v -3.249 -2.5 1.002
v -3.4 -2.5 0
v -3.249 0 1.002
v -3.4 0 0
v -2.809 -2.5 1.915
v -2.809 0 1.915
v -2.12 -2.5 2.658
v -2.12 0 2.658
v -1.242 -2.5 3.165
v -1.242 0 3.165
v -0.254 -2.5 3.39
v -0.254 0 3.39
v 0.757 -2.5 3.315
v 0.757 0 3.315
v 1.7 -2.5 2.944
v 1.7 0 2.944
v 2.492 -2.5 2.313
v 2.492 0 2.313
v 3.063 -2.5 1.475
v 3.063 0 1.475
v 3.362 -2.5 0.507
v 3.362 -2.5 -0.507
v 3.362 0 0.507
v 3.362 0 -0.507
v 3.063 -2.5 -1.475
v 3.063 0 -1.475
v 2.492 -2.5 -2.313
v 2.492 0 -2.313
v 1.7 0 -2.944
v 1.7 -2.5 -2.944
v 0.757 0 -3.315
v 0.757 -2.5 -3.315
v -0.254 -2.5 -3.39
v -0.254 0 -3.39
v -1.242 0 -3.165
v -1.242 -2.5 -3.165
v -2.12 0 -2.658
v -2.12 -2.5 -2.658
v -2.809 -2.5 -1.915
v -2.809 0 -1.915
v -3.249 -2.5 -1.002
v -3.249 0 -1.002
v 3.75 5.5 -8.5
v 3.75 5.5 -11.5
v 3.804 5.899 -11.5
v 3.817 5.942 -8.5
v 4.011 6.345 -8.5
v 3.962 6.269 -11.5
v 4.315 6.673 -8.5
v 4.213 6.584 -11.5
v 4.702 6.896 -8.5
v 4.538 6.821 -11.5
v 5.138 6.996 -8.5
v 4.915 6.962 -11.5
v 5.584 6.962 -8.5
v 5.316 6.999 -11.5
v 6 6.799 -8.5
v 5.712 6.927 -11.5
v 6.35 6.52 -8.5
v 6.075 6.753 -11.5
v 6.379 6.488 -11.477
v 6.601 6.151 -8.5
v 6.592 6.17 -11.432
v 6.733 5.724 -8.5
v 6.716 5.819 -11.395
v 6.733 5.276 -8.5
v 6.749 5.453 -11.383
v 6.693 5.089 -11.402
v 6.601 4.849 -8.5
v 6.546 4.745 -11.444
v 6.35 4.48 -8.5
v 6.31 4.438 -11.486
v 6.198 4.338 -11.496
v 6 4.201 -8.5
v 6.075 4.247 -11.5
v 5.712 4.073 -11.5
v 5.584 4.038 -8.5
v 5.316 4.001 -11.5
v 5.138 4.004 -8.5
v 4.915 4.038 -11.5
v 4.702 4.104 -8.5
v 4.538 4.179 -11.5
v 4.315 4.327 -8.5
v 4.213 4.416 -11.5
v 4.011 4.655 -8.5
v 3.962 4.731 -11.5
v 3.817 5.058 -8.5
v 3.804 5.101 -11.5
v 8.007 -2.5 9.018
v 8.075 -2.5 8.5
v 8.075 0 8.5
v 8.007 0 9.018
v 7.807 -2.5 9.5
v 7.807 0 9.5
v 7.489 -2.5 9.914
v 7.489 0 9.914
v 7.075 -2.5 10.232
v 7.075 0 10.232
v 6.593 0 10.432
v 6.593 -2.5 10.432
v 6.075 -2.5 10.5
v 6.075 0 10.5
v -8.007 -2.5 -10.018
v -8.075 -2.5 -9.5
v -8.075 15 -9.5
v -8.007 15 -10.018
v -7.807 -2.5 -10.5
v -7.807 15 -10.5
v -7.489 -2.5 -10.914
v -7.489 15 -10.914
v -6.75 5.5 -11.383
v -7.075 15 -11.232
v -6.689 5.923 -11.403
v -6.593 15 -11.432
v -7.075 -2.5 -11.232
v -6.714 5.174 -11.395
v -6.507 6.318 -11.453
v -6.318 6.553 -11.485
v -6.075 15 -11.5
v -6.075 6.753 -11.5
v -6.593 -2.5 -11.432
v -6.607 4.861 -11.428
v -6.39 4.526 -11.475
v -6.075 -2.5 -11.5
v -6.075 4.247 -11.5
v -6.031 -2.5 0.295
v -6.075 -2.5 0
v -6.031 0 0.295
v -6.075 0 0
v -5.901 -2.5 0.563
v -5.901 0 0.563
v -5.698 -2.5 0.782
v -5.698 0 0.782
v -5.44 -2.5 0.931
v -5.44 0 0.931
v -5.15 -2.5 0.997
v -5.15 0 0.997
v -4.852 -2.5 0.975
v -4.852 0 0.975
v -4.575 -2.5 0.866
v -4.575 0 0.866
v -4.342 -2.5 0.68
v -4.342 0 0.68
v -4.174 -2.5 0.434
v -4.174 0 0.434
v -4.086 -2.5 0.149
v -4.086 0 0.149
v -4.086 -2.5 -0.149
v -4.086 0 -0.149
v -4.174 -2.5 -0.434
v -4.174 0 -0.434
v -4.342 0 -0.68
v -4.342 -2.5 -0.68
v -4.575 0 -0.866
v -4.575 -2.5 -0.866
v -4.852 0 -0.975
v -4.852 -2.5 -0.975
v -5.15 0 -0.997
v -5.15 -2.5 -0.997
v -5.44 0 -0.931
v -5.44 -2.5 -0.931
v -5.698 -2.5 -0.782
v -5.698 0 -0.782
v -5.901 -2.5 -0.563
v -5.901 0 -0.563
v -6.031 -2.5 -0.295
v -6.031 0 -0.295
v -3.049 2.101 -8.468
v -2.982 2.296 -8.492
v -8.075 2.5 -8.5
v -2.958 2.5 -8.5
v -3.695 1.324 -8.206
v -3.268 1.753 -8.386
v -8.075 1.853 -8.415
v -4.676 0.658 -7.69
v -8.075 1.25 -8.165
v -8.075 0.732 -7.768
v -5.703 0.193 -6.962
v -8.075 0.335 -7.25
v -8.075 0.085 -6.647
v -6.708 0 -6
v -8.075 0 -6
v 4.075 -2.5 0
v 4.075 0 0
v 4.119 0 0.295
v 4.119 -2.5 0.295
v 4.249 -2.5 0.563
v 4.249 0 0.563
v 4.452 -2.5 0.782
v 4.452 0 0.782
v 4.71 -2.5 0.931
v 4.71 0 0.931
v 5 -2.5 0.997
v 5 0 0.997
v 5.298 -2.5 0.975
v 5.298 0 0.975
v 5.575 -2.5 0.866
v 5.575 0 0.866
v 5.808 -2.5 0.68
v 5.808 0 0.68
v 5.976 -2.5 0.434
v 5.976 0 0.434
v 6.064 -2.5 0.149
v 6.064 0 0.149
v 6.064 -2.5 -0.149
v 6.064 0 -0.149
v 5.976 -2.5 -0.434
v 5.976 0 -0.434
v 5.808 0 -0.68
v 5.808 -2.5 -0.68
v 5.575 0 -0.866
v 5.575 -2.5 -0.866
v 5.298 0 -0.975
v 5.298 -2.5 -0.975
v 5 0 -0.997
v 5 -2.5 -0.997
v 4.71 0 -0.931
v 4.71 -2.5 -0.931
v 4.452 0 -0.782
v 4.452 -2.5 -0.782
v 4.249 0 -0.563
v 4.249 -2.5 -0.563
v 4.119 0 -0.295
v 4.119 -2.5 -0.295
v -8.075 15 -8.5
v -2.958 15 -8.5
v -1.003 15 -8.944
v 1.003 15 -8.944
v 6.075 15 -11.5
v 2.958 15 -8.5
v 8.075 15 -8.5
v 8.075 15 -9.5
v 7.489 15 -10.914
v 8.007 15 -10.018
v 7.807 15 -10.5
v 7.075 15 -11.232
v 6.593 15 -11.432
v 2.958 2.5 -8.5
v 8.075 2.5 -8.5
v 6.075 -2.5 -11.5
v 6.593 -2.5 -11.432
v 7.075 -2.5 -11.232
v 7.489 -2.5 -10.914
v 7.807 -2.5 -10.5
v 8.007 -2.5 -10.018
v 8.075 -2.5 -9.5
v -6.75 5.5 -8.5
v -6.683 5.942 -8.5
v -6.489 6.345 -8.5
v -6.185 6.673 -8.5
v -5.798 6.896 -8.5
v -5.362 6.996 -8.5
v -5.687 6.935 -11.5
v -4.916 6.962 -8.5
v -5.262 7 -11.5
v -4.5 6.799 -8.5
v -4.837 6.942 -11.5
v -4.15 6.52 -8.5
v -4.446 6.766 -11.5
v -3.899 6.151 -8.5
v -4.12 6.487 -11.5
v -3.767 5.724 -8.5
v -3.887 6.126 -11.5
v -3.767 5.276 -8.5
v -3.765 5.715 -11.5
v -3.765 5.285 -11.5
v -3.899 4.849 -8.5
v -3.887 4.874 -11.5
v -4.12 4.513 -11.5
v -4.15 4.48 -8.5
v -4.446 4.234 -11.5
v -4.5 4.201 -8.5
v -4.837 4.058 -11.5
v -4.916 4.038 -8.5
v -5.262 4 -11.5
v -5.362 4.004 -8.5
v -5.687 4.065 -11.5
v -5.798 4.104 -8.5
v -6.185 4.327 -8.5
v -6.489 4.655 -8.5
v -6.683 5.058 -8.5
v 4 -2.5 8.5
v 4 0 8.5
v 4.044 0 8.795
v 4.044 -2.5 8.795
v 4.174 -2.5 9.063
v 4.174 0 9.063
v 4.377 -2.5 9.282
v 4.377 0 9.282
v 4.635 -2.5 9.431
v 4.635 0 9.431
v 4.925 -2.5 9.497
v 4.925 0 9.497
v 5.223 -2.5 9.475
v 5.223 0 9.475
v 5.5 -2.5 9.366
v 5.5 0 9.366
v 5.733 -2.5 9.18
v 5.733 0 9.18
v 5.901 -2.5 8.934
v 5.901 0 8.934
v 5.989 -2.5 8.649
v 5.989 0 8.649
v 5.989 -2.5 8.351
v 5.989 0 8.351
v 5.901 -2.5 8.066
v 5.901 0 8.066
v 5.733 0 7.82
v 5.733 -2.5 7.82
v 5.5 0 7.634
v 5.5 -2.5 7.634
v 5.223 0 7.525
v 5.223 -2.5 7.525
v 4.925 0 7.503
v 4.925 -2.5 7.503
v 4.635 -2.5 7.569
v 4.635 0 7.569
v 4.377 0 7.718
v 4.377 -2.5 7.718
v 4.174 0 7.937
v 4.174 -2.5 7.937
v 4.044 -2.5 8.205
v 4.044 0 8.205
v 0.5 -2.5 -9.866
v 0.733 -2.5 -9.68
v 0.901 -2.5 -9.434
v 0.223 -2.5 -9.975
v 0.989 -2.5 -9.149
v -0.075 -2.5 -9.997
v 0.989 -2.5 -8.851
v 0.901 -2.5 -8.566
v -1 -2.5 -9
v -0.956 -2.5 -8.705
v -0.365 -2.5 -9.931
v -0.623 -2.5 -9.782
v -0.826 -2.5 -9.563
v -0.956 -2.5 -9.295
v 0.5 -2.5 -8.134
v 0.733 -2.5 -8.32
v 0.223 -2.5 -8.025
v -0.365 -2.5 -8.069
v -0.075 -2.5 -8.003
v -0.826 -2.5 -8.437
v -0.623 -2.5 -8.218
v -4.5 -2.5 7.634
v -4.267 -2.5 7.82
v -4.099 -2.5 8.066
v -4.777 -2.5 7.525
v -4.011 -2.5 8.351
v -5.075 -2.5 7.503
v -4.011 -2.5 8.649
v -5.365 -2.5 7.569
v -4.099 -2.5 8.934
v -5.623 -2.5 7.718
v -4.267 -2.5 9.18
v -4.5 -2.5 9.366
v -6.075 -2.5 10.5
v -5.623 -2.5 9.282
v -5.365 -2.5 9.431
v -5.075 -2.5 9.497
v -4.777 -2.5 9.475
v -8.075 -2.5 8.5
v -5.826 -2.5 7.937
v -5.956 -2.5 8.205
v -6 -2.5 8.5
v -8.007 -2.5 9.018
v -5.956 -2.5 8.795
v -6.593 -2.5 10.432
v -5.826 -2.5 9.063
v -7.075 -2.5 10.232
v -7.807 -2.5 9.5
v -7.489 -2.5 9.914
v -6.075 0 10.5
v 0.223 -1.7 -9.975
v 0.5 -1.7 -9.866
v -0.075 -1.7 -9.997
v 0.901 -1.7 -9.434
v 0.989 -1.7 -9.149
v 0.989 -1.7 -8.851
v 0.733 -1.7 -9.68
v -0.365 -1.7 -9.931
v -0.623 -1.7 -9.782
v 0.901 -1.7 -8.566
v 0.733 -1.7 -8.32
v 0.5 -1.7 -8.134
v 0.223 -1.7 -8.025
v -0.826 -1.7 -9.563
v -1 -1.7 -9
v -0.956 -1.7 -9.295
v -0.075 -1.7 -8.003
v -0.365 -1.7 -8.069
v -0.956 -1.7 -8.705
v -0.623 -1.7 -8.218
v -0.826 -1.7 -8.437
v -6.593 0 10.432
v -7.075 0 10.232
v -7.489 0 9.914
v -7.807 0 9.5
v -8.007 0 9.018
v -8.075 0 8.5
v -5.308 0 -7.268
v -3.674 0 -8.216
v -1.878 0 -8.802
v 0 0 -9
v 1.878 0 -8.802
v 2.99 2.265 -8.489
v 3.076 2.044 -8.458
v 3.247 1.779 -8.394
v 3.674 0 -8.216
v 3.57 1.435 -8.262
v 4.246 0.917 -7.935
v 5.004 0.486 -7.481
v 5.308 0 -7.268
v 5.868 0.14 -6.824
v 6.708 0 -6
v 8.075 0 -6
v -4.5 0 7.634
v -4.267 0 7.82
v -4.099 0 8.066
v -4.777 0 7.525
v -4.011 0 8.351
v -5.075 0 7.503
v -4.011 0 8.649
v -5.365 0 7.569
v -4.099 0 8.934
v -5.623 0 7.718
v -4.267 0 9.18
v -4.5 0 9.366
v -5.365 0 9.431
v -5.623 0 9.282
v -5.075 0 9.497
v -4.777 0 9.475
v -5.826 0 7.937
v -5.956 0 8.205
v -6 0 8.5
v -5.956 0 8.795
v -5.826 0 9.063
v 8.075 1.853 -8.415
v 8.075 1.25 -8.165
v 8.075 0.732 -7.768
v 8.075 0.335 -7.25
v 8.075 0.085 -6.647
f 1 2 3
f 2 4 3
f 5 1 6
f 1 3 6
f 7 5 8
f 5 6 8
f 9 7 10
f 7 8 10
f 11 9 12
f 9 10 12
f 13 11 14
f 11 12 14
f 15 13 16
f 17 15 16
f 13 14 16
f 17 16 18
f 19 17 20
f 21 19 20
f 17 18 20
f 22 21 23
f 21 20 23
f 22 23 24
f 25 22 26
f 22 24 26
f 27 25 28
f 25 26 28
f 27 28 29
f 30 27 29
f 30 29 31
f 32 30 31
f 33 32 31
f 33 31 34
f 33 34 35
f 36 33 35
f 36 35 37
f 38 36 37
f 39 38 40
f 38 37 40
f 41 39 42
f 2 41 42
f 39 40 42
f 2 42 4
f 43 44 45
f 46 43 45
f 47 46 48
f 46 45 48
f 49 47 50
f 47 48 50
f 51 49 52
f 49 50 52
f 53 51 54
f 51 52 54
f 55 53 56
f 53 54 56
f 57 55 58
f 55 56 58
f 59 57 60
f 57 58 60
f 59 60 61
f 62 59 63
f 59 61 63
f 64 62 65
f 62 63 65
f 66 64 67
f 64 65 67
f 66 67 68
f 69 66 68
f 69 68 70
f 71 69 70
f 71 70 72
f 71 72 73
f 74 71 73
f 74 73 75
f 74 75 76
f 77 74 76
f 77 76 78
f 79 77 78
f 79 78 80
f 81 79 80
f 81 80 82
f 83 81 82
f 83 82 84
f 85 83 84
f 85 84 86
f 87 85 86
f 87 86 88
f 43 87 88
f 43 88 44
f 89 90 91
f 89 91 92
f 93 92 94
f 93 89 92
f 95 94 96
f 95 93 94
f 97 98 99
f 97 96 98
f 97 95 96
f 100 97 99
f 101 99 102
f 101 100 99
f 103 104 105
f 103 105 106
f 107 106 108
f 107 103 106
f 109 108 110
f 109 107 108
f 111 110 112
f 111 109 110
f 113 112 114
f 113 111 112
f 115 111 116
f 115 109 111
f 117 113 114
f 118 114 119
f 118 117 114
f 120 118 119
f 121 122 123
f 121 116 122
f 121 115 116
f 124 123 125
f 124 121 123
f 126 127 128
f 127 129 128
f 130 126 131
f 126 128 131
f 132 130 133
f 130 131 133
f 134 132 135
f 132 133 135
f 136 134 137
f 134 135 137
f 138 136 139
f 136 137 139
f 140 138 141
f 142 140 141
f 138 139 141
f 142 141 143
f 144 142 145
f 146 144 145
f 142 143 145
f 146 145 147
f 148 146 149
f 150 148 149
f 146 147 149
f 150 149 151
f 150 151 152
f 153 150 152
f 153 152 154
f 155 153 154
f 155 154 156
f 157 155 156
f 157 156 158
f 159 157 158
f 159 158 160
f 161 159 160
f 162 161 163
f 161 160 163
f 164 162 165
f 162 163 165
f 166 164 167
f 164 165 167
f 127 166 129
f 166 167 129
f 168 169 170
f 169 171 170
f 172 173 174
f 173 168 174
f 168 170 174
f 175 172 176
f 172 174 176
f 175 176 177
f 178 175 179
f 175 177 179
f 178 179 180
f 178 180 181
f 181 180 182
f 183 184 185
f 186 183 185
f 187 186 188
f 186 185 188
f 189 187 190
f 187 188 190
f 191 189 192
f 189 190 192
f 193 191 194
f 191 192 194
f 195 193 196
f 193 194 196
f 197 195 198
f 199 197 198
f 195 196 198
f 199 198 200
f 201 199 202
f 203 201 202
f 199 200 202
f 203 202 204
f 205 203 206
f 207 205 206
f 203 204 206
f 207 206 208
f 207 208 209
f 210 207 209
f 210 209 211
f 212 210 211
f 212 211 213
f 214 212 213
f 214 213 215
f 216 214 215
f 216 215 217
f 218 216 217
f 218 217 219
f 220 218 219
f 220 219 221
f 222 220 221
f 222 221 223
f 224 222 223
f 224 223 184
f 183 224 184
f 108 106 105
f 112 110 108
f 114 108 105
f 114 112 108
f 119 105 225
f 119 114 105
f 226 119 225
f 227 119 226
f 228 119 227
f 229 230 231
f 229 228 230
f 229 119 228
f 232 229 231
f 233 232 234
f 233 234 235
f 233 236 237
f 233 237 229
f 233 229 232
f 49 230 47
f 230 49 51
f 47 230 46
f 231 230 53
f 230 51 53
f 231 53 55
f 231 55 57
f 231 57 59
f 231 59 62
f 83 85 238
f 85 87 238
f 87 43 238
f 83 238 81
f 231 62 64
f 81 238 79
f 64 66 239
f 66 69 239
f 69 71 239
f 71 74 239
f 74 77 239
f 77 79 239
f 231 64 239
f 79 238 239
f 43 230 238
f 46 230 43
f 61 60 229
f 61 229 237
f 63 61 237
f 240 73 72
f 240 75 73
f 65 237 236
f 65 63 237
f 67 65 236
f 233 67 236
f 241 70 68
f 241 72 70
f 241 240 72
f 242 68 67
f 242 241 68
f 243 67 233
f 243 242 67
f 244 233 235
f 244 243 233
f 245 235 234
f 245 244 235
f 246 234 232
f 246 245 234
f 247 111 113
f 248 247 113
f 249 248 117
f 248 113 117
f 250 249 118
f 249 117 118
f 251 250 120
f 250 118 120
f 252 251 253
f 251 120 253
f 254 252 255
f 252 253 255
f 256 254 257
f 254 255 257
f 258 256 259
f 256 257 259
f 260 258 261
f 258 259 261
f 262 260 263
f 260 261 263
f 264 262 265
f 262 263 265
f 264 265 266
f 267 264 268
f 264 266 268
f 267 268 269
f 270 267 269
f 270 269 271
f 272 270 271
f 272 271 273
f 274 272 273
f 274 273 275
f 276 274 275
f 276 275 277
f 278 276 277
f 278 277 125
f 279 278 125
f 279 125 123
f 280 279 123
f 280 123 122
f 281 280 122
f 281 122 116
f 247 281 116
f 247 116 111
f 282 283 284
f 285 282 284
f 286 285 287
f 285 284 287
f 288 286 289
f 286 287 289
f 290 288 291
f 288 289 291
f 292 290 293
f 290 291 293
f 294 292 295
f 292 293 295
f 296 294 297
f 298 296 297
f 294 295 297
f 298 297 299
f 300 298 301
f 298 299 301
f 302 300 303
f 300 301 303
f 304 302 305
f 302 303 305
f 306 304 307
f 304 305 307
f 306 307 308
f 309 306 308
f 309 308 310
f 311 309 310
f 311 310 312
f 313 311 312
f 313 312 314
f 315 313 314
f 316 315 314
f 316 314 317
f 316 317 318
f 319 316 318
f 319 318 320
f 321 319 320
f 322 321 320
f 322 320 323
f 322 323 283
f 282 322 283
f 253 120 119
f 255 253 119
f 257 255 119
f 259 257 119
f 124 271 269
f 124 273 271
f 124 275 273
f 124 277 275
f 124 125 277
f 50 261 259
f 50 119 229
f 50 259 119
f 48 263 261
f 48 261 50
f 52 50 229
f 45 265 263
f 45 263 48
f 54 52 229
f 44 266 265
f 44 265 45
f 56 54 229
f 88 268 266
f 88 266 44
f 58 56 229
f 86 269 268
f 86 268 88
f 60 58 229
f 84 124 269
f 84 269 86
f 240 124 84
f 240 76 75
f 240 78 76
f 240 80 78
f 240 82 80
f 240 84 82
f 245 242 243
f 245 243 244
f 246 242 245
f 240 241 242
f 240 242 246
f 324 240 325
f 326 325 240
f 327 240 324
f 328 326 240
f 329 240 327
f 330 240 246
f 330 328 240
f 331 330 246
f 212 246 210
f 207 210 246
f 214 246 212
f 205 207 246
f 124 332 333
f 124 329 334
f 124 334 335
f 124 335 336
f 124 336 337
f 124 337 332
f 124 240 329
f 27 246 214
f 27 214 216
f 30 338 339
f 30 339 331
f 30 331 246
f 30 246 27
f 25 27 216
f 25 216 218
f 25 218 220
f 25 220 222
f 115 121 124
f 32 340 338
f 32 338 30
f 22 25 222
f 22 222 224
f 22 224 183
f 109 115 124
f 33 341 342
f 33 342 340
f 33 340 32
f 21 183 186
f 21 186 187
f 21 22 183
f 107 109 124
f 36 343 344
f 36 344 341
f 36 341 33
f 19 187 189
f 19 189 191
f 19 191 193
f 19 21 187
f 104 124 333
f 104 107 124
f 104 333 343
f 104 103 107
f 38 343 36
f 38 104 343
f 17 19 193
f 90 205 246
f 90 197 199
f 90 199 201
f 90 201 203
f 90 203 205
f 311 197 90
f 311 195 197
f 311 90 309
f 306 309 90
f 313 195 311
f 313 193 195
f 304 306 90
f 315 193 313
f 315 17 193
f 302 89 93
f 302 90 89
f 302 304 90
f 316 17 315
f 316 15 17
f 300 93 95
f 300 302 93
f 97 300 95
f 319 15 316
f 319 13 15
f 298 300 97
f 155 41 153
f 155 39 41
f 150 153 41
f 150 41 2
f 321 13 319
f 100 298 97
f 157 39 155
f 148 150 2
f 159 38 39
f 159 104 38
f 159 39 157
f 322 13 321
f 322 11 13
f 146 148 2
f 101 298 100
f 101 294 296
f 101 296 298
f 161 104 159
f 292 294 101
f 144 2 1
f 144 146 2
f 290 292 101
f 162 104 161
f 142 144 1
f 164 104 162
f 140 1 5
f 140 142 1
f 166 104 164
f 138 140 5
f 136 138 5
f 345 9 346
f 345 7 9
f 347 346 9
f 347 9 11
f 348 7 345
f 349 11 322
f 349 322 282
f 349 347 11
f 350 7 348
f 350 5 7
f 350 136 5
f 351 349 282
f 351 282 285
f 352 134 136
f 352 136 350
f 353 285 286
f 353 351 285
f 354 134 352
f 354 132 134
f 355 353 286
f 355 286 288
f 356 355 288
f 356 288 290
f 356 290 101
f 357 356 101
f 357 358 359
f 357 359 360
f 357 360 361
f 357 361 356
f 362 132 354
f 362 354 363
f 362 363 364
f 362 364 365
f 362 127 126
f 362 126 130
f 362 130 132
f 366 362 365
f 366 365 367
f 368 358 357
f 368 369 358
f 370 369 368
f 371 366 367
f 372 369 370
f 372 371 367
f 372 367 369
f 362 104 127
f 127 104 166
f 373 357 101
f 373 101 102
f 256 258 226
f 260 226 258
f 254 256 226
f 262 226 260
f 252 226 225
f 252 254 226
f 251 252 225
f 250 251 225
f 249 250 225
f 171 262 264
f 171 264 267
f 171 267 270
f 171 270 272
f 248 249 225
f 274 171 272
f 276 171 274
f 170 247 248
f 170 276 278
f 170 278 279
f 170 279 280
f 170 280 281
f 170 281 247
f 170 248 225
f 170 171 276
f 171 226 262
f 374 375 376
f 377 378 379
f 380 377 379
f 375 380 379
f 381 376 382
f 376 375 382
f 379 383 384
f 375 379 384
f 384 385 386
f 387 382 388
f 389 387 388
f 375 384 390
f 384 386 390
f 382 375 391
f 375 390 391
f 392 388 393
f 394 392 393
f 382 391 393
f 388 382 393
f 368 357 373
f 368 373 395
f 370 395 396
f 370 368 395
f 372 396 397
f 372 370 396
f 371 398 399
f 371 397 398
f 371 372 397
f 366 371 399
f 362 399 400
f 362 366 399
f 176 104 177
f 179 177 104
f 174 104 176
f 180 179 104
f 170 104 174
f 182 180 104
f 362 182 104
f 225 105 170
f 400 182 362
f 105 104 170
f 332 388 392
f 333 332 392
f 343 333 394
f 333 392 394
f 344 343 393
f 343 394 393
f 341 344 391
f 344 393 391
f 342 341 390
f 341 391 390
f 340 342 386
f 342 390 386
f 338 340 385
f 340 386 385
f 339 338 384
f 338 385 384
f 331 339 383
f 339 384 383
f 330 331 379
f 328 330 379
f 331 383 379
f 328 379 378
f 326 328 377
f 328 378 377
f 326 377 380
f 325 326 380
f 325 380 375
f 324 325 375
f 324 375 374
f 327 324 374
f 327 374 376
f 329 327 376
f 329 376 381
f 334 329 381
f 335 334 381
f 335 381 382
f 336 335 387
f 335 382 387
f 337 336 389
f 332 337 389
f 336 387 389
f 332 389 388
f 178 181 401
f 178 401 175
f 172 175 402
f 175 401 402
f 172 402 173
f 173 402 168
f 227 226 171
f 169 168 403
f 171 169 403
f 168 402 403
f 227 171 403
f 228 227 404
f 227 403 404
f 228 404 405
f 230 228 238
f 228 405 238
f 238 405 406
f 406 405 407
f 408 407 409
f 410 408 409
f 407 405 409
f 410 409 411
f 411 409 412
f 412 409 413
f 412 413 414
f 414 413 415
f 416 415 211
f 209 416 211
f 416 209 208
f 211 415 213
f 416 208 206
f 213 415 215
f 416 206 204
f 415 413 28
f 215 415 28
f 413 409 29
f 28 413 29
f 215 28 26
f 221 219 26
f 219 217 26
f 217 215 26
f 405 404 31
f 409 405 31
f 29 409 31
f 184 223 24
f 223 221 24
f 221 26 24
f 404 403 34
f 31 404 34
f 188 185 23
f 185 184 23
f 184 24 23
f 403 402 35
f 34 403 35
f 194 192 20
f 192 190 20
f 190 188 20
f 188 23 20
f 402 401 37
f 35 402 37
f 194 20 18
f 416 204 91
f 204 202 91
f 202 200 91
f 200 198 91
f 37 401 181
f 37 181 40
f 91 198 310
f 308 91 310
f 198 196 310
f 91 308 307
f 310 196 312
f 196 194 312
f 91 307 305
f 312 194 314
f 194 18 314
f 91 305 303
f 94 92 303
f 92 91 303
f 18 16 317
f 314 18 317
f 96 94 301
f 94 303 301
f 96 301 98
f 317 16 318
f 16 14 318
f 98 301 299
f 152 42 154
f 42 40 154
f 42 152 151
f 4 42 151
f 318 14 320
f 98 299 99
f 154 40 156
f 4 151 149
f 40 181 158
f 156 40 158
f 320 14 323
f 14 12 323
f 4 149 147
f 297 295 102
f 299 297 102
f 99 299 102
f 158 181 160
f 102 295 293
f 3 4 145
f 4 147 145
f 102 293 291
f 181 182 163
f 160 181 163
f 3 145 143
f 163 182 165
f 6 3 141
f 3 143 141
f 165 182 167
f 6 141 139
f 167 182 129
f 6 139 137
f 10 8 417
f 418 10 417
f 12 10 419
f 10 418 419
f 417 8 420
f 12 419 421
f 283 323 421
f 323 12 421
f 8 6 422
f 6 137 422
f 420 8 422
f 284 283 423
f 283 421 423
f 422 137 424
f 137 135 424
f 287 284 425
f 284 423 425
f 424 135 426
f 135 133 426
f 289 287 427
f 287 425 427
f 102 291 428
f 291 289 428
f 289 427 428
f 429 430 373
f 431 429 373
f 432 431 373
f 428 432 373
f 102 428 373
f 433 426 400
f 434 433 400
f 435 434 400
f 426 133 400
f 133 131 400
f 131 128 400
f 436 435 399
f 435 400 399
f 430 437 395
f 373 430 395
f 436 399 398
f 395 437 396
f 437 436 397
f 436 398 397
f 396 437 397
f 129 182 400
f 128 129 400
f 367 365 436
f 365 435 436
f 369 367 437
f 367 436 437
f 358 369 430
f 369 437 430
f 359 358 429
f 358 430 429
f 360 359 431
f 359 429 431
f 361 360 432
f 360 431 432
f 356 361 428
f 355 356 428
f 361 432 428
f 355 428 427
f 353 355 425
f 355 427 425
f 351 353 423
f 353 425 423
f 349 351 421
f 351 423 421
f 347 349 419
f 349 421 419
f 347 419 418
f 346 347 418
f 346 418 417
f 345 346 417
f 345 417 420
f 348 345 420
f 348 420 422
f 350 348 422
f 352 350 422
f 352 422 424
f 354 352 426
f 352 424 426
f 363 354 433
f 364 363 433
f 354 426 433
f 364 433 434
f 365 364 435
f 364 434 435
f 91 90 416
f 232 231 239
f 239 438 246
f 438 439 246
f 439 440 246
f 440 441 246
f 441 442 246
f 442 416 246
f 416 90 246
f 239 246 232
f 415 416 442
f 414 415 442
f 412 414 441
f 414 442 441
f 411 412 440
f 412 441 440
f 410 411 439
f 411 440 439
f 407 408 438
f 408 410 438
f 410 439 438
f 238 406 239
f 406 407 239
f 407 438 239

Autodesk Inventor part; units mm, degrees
ref_plane "YZ Plane" through (0, 0, 0) normal (1, 0, 0) x (0, 1, 0)
ref_plane "XZ Plane" through (0, 0, 0) normal (0, 1, 0) x (-1, 0, 0)
ref_plane "XY Plane" through (0, 0, 0) normal (0, 0, 1) x (1, 0, 0)
sketch "sk_main" plane through (0, 0, 0) normal (1, 0, 0) x (0, 1, 0)
  line L0 (-8, 0) -> (30.5, 0) projected
  line L1 (0, -15.9) -> (0, 14.9) projected
  line L2 (25, -7.5) -> (0, -7.5)
  line L3 (0, -7.5) -> (0, 9)
  line L4 (25, -11.5) -> (-2.5, -11.5)
  line L5 (-2.5, -11.5) -> (-2.5, 10.5)
  line L6 (0, 10.5) -> (0, -11.5)
  line L7 (25, -7.5) -> (25, -11.5)
  line L8 (-2.5, 10.5) -> (0, 10.5)
  point P0 (0, 0)
  dimension "d5" = 2.5
  dimension "d35" = 25
  dimension "d37" = 4
  dimension "d38" = 18
  dimension "d58" = 10.5
extrude "ext_main_back" [suppressed]
extrude "ext_main_front" add sketch "sk_main" along normal mid plane 12.15 contours L5 L8 L1 L0 | L0 L1 L4 L5
sketch "sk_front" plane through (0, 0, 0) normal (0, 1, 0) x (-1, 0, 0)
  line L0 (0, -22.55) -> (0, 16.3) projected
  line L1 (12.1092, 0) -> (-12.1092, 0) projected
  circle A0 centre (0, 0) radius 3.4
  circle A1 centre (5.075, 0) radius 1
  circle A2 centre (-5.075, 0) radius 1
  circle A3 centre (0, 0) radius 8 construction
  circle A4 centre (0, -9) radius 8 construction
  circle A5 centre (0, -9) radius 1
  line L2 (8.6494, -4.5) -> (-8.6494, -4.5) construction
  line L3 (-6.075, 10.5) -> (-6.075, -11.5) projected
  line L4 (6.075, -11.5) -> (6.075, 10.5) projected
  line L5 (6.075, -11.5) -> (-6.075, -11.5) projected
  circle A6 centre (-5, 8.5) radius 1
  circle A7 centre (-5, 8.5) radius 2.25 construction
  line L6 (-5, 8.5) -> (5, 8.5) construction
  circle A8 centre (5, 8.5) radius 2.25 construction
  circle A9 centre (5, 8.5) radius 1
  line L7 (6.075, 10.5) -> (6.075, -11.5)
  line L8 (6.075, -11.5) -> (8.075, -11.5)
  line L9 (8.075, -11.5) -> (8.075, 10.5)
  line L10 (8.075, 10.5) -> (6.075, 10.5)
  line L11 (-6.075, -11.5) -> (-6.075, 10.5)
  line L12 (-6.075, 10.5) -> (-8.075, 10.5)
  line L13 (-8.075, 10.5) -> (-8.075, -11.5)
  line L14 (-8.075, -11.5) -> (-6.075, -11.5)
  point P0 (0, 8.5)
  dimension "d11" = 6.8
  dimension "d12" = 2
  dimension "d13" = 10.15
  dimension "d14" = 16
  dimension "d15" = 16
  dimension "d16" = 9
  dimension "d17" = 2
  dimension "d27" = 2
  dimension "d28" = 4.5
  dimension "d30" = 10
  dimension "d31" = 8.5
  dimension "d39" = 2
extrude "ext_front_tabs" add sketch "sk_front" against normal up to surface (2.5 mm away) contours L4 L1 L9 L8 | L14 L13 L1 L3 | L4 L10 L9 L1 | L1 L13 L12 L3
extrude "ext_cut_holesfront" cut sketch "sk_front" against normal through all contours A5 L0 | L0 A5 | A1 L1 | L1 A1 | A2 L1 | L1 A2 | A0 L1 L0 | L0 L1 A0 | L1 A0 L0 | L0 A0 L1 | A6 | A9
fillet "Fillet5" radius 2 4 edges at (-8.075, -1.25, -11.5) (8.075, -1.25, -11.5) (8.075, -1.25, 10.5) (-8.075, -1.25, 10.5)
sketch "Sketch7" plane through (8.075, 0, 8.5) normal (0, 1, 0) x (1, 0, 0)
  line L0 (0, 0) -> (0, 18) projected
  arc A0 (0, 18) -> (-2, 20) centre (-2, 18) ccw projected
  line L1 (-14.15, 20) -> (-2, 20) projected
  arc A1 (-14.15, 20) -> (-16.15, 18) centre (-14.15, 18) ccw projected
  line L2 (-16.15, 18) -> (-16.15, 0) projected
  circle A2 centre (-8.075, 8.5) radius 3.4 projected
  circle A3 centre (-8.075, 8.5) radius 9
  line L3 (-11.033, 17) -> (-16.15, 17)
  line L4 (-5.117, 17) -> (0, 17)
  line L5 (-2, -2) -> (-14.15, -2) projected
  line L6 (-16.15, 17) -> (-16.15, 21)
  line L7 (-16.15, 21) -> (0, 21)
  line L8 (0, 21) -> (0, 17)
  dimension "d45" = 18
  dimension "d46" = 3
  dimension "d57" = 1
extrude "ext_backtab" add sketch "Sketch7" along normal blind 15 contours L4 A3 L3 L2 A1 L1 A0 L0
sketch "Sketch8" plane through (6.075, -2.5, -11.5) normal (0, 0, -1) x (-1, 0, 0)
  line L0 (12.15, 0) -> (0, 0) projected
  line L1 (0, 17.5) -> (12.15, 17.5) projected
  line L2 (6.075, 0) -> (6.075, 17.5)
  circle A0 centre (0.825, 8) radius 1.5
  circle A1 centre (11.325, 8) radius 1.5
  line L3 (0.825, 8) -> (11.325, 8) construction
  point P0 (6.075, 2.5)
  dimension "d49" = 3
  dimension "d50" = 10.5
  dimension "d56" = 8
extrude "ext_cut_mountholes" cut sketch "Sketch8" against normal up to next
fillet "Fillet6" radius 2.5 2 edges at (5.5165, 0, -8.5) (-5.5165, 0, -8.5)
extrude "ext_dowelfill" add sketch "sk_front" against normal blind 1.7 contours A5 L0 | L0 A5
equation "\"d12\" = screw_m2_bore_selfthreading"
equation "\"d17\" = screw_m2_bore_selfthreading"
equation "\"d27\" = screw_m2_bore_selfthreading"
equation "\"d28\" = screw_m2_head_maxsize"
equation "\"d49\" = screw_m3_bore_selfthreading"
equation "\"screw_m2_bore_selfthreading\" = 2"
equation "\"screw_m2_head_maxsize\" = 4.5"
equation "\"screw_m3_bore_selfthreading\" = 3"
properties part number "empty"
